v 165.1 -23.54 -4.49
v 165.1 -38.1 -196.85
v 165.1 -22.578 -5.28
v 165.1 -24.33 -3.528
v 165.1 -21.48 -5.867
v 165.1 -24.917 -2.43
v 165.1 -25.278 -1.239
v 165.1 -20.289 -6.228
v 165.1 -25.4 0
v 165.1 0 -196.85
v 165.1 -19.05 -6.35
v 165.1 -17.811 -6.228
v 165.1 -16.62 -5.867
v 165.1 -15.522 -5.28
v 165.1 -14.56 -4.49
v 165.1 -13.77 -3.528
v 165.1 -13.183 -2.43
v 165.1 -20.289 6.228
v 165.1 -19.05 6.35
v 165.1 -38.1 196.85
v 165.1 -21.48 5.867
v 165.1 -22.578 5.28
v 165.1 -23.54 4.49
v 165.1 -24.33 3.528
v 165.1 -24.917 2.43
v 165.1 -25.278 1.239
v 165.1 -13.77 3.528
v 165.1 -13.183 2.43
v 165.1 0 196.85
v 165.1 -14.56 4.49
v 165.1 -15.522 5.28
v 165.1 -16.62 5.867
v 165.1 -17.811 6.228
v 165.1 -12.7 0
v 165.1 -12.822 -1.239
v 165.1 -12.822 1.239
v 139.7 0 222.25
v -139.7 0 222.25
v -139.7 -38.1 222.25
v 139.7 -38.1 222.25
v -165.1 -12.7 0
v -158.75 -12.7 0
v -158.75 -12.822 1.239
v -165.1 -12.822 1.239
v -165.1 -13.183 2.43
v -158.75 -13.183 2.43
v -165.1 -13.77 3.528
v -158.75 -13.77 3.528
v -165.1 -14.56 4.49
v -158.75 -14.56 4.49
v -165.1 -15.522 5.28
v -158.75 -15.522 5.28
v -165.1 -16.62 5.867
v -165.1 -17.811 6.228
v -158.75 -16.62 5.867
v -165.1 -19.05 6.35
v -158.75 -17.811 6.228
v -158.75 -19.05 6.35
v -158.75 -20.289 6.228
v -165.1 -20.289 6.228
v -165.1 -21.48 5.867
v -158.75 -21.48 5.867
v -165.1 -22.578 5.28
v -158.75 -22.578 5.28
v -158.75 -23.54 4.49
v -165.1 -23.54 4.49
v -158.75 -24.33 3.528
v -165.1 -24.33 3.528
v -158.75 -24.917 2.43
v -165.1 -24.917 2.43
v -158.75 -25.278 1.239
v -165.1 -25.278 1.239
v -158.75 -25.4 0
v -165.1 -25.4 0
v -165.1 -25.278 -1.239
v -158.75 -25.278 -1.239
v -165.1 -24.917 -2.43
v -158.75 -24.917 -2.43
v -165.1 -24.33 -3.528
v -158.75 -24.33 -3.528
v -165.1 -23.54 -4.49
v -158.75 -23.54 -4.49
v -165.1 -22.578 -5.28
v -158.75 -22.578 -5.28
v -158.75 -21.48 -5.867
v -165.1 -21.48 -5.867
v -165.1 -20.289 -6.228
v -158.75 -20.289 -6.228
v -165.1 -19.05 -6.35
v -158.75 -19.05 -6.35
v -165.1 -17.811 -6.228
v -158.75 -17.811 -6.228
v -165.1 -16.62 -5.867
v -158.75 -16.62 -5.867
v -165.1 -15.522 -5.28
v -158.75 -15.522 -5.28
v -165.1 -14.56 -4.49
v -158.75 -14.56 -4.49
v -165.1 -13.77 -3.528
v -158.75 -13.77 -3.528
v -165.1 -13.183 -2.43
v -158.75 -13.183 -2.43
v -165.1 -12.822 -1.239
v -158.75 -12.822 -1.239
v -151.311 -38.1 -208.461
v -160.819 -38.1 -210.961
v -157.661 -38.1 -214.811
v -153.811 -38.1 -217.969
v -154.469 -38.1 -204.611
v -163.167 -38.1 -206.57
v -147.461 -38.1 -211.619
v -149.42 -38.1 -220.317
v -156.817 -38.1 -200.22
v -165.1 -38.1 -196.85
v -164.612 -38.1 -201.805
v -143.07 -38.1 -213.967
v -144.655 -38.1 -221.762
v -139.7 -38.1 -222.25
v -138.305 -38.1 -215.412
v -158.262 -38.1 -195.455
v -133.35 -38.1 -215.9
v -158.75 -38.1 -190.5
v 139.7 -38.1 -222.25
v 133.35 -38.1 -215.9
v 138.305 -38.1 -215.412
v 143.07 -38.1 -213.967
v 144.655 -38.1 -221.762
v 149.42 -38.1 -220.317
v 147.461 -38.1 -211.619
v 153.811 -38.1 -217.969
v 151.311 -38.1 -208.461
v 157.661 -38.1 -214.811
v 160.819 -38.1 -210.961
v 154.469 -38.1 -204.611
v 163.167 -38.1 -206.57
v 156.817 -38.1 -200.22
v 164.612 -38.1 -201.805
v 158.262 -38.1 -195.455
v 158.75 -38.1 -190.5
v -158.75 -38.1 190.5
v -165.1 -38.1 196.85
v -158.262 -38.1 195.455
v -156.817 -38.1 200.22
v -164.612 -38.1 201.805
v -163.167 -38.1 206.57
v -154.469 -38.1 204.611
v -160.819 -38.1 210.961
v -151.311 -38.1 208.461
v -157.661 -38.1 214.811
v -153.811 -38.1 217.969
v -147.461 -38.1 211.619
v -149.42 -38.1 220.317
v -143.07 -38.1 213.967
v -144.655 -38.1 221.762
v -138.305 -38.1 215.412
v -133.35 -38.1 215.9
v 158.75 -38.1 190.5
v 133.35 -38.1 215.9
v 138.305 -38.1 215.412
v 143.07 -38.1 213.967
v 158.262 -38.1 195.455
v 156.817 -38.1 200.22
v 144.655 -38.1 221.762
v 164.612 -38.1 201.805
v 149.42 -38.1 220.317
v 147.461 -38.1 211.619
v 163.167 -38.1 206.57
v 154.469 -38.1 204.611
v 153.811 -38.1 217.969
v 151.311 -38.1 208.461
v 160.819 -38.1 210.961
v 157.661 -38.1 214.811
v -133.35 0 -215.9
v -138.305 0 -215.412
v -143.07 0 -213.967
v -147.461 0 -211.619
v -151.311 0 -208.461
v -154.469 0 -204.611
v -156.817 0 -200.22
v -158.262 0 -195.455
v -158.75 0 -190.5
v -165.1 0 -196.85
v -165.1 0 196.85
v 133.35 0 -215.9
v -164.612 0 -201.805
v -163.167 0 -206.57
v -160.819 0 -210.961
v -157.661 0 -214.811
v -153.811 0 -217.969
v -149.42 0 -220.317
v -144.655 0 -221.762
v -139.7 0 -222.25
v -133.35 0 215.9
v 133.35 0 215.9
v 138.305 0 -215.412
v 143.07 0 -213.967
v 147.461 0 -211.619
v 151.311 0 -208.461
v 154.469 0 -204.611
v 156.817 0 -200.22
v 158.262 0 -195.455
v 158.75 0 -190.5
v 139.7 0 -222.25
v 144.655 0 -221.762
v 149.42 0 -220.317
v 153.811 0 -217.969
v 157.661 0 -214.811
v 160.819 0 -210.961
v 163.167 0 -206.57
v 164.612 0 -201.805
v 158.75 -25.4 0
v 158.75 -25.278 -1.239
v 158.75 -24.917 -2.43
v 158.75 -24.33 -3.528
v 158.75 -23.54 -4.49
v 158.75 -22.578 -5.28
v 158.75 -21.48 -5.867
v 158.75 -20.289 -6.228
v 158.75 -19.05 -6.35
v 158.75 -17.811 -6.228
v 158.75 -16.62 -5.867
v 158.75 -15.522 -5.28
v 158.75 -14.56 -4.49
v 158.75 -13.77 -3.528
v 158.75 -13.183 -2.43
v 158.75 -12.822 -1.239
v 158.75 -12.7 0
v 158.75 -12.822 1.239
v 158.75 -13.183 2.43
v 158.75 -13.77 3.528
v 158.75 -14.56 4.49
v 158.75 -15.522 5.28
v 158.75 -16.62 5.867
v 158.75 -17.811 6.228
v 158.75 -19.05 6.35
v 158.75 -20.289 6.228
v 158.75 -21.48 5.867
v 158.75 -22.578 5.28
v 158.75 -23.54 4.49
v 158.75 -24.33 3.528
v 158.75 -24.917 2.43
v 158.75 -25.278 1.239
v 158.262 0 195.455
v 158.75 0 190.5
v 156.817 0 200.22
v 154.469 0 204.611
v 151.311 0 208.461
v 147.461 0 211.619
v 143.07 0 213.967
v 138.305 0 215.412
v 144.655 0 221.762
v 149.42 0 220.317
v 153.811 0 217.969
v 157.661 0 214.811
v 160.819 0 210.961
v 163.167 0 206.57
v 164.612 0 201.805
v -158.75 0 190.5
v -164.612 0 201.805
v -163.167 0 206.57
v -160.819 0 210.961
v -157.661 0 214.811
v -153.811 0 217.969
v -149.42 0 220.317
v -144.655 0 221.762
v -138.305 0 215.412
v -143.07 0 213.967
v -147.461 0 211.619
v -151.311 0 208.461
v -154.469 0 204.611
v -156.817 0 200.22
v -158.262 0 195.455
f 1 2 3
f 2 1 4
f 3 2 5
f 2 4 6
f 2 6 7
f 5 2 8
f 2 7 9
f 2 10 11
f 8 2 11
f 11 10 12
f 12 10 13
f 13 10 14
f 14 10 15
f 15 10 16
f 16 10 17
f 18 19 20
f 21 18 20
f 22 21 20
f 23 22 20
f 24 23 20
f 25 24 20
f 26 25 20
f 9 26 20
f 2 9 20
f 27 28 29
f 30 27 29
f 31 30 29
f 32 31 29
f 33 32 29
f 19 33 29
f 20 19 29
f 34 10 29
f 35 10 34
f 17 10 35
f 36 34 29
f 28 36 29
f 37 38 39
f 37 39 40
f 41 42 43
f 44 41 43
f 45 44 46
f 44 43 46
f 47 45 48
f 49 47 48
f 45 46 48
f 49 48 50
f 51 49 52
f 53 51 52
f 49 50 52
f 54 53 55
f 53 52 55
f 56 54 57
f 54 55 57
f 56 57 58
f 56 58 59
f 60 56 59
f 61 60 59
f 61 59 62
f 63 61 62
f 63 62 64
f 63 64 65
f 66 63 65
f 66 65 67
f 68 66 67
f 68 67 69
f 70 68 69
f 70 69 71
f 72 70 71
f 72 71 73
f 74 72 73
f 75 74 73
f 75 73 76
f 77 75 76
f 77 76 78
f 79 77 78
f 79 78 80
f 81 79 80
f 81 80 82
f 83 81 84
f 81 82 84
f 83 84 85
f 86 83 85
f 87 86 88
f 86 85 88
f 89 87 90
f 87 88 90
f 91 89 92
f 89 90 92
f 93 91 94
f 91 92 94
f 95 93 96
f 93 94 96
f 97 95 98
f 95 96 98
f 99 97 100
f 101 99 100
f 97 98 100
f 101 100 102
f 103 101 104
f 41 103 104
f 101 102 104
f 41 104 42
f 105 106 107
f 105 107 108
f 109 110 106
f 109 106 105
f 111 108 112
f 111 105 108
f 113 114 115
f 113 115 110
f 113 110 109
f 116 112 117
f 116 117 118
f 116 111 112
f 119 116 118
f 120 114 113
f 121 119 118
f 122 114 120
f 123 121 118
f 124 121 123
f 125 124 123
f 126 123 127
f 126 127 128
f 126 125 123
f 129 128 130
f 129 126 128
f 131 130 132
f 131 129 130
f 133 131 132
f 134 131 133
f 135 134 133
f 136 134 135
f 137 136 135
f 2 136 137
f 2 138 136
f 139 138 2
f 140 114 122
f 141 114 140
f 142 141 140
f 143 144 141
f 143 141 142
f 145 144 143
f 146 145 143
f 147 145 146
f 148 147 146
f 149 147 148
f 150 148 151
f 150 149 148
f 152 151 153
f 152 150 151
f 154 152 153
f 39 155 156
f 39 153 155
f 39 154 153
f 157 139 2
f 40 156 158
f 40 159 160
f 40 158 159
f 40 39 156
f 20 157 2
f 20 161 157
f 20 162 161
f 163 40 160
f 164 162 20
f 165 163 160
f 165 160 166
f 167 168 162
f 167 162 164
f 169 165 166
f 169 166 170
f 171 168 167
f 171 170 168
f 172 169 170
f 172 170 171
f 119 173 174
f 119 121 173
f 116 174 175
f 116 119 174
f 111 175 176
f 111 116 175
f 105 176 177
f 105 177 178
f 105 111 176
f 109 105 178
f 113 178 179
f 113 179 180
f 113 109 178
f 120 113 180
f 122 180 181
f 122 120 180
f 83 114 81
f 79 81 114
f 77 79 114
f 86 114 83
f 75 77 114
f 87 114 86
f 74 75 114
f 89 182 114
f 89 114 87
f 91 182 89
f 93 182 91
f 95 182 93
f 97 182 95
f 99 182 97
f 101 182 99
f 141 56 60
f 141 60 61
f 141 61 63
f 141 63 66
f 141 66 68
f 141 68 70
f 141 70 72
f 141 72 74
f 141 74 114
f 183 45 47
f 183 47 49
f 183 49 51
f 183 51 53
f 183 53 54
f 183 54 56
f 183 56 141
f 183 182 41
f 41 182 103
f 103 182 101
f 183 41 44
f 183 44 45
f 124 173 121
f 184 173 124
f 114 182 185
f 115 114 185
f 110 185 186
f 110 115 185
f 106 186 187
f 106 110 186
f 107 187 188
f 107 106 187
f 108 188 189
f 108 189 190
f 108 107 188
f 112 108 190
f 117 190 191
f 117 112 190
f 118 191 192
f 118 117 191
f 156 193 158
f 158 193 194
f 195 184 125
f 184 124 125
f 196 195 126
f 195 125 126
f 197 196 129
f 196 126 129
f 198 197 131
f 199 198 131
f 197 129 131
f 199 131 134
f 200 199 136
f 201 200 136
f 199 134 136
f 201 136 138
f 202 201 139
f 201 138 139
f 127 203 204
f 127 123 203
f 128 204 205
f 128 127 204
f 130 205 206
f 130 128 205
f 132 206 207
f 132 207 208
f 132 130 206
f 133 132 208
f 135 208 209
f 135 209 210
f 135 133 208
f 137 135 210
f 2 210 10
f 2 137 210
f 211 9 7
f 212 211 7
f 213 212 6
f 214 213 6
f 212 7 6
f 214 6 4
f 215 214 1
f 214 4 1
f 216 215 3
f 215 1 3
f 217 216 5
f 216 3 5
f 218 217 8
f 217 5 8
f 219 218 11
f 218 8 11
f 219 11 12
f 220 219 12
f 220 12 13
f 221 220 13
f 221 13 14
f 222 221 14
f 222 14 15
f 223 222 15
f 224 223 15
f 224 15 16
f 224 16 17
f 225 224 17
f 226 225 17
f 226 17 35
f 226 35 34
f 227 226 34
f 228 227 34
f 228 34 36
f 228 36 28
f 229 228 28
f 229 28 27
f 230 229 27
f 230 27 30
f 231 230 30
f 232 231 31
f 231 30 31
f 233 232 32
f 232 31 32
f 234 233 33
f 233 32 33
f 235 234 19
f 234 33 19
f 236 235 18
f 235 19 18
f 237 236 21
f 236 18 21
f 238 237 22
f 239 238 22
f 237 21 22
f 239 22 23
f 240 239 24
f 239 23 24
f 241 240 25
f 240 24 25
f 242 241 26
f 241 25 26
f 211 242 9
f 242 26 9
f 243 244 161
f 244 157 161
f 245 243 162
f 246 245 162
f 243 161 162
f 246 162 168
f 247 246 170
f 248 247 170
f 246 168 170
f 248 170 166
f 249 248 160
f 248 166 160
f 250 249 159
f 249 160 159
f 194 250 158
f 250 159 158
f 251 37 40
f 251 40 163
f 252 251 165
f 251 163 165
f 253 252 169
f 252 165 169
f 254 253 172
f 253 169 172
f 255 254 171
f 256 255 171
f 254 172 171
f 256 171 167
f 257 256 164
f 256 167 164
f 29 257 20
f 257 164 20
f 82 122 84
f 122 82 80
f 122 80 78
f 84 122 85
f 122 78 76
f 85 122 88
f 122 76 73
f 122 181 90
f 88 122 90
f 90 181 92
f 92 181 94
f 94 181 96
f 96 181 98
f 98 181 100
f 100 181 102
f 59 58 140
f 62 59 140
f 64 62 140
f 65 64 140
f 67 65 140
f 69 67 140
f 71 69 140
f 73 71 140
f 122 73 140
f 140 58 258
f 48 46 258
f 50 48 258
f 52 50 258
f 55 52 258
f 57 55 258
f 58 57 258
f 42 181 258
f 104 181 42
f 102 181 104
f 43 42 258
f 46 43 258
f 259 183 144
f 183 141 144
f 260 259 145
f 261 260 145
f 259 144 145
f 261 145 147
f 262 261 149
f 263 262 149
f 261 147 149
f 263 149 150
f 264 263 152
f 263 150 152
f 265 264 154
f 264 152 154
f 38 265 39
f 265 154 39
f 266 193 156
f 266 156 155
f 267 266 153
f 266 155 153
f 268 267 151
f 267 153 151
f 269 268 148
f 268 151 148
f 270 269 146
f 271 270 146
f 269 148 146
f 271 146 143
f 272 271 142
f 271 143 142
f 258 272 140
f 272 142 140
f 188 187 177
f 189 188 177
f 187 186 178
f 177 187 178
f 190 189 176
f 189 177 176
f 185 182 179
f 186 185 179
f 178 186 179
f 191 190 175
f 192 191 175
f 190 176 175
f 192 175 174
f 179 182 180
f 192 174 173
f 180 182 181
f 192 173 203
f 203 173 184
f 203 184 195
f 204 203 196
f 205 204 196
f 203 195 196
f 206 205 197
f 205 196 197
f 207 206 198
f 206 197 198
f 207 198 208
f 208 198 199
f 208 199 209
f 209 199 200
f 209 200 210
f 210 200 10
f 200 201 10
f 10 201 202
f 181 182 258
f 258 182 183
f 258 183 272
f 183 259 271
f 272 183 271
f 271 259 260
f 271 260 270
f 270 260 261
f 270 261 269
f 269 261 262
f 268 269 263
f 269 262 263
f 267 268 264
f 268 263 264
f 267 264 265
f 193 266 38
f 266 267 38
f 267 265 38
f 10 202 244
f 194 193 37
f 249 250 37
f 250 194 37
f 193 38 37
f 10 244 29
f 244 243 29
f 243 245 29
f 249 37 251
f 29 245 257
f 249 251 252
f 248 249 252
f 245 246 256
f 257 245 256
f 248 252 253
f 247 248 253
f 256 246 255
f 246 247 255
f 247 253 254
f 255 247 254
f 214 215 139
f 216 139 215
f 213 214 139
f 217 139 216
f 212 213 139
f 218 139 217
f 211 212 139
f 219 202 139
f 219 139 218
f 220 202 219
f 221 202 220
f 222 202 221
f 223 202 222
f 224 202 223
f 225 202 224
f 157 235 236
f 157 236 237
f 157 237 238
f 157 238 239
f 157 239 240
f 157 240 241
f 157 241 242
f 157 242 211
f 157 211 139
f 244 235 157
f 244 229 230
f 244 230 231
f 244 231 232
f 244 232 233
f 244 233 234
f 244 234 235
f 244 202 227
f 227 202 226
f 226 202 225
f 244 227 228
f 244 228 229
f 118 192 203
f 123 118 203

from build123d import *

# Parameters (mm, degrees)
F0_W     = 330.2
F0_H     = 444.5
F0_W_2   = 317.5
F0_H_2   = 431.8
F1_DEPTH = 38.1
F2_R     = 25.4
F3_D     = 12.7
F3_DEPTH = 165.101
F4_D     = 12.7


with BuildPart() as f1:
    # F0 (on Front) → F1 (new body)
    with BuildSketch(Plane.XZ):
        Rectangle(F0_W, F0_H)
        Rectangle(F0_W_2, F0_H_2, mode=Mode.SUBTRACT)
    extrude(amount=F1_DEPTH)

    # F2
    f2_edges = [f1.edges().sort_by_distance(p)[0] for p in [
        (158.75, -19.05, -215.9),
        (158.75, -19.05, 215.9),
        (-158.75, -19.05, 215.9),
        (-158.75, -19.05, -215.9),
        (165.1, -19.05, 222.25),
        (165.1, -19.05, -222.25),
        (-165.1, -19.05, -222.25),
        (-165.1, -19.05, 222.25),
    ]]
    fillet(f2_edges, radius=F2_R)

    # F3 (through all, one way)
    with BuildSketch(Plane.YZ):
        with Locations((-19.05, 0)):
            Circle(F3_D / 2)
    extrude(amount=-F3_DEPTH, mode=Mode.SUBTRACT)

    # F4 (through all)
    with Locations(Plane(origin=(0, 0, 0), x_dir=(0, 1, 0), z_dir=(-1, 0, 0))):
        with Locations((-19.05, 0)):
            Hole(F4_D / 2)


solid = f1.part
